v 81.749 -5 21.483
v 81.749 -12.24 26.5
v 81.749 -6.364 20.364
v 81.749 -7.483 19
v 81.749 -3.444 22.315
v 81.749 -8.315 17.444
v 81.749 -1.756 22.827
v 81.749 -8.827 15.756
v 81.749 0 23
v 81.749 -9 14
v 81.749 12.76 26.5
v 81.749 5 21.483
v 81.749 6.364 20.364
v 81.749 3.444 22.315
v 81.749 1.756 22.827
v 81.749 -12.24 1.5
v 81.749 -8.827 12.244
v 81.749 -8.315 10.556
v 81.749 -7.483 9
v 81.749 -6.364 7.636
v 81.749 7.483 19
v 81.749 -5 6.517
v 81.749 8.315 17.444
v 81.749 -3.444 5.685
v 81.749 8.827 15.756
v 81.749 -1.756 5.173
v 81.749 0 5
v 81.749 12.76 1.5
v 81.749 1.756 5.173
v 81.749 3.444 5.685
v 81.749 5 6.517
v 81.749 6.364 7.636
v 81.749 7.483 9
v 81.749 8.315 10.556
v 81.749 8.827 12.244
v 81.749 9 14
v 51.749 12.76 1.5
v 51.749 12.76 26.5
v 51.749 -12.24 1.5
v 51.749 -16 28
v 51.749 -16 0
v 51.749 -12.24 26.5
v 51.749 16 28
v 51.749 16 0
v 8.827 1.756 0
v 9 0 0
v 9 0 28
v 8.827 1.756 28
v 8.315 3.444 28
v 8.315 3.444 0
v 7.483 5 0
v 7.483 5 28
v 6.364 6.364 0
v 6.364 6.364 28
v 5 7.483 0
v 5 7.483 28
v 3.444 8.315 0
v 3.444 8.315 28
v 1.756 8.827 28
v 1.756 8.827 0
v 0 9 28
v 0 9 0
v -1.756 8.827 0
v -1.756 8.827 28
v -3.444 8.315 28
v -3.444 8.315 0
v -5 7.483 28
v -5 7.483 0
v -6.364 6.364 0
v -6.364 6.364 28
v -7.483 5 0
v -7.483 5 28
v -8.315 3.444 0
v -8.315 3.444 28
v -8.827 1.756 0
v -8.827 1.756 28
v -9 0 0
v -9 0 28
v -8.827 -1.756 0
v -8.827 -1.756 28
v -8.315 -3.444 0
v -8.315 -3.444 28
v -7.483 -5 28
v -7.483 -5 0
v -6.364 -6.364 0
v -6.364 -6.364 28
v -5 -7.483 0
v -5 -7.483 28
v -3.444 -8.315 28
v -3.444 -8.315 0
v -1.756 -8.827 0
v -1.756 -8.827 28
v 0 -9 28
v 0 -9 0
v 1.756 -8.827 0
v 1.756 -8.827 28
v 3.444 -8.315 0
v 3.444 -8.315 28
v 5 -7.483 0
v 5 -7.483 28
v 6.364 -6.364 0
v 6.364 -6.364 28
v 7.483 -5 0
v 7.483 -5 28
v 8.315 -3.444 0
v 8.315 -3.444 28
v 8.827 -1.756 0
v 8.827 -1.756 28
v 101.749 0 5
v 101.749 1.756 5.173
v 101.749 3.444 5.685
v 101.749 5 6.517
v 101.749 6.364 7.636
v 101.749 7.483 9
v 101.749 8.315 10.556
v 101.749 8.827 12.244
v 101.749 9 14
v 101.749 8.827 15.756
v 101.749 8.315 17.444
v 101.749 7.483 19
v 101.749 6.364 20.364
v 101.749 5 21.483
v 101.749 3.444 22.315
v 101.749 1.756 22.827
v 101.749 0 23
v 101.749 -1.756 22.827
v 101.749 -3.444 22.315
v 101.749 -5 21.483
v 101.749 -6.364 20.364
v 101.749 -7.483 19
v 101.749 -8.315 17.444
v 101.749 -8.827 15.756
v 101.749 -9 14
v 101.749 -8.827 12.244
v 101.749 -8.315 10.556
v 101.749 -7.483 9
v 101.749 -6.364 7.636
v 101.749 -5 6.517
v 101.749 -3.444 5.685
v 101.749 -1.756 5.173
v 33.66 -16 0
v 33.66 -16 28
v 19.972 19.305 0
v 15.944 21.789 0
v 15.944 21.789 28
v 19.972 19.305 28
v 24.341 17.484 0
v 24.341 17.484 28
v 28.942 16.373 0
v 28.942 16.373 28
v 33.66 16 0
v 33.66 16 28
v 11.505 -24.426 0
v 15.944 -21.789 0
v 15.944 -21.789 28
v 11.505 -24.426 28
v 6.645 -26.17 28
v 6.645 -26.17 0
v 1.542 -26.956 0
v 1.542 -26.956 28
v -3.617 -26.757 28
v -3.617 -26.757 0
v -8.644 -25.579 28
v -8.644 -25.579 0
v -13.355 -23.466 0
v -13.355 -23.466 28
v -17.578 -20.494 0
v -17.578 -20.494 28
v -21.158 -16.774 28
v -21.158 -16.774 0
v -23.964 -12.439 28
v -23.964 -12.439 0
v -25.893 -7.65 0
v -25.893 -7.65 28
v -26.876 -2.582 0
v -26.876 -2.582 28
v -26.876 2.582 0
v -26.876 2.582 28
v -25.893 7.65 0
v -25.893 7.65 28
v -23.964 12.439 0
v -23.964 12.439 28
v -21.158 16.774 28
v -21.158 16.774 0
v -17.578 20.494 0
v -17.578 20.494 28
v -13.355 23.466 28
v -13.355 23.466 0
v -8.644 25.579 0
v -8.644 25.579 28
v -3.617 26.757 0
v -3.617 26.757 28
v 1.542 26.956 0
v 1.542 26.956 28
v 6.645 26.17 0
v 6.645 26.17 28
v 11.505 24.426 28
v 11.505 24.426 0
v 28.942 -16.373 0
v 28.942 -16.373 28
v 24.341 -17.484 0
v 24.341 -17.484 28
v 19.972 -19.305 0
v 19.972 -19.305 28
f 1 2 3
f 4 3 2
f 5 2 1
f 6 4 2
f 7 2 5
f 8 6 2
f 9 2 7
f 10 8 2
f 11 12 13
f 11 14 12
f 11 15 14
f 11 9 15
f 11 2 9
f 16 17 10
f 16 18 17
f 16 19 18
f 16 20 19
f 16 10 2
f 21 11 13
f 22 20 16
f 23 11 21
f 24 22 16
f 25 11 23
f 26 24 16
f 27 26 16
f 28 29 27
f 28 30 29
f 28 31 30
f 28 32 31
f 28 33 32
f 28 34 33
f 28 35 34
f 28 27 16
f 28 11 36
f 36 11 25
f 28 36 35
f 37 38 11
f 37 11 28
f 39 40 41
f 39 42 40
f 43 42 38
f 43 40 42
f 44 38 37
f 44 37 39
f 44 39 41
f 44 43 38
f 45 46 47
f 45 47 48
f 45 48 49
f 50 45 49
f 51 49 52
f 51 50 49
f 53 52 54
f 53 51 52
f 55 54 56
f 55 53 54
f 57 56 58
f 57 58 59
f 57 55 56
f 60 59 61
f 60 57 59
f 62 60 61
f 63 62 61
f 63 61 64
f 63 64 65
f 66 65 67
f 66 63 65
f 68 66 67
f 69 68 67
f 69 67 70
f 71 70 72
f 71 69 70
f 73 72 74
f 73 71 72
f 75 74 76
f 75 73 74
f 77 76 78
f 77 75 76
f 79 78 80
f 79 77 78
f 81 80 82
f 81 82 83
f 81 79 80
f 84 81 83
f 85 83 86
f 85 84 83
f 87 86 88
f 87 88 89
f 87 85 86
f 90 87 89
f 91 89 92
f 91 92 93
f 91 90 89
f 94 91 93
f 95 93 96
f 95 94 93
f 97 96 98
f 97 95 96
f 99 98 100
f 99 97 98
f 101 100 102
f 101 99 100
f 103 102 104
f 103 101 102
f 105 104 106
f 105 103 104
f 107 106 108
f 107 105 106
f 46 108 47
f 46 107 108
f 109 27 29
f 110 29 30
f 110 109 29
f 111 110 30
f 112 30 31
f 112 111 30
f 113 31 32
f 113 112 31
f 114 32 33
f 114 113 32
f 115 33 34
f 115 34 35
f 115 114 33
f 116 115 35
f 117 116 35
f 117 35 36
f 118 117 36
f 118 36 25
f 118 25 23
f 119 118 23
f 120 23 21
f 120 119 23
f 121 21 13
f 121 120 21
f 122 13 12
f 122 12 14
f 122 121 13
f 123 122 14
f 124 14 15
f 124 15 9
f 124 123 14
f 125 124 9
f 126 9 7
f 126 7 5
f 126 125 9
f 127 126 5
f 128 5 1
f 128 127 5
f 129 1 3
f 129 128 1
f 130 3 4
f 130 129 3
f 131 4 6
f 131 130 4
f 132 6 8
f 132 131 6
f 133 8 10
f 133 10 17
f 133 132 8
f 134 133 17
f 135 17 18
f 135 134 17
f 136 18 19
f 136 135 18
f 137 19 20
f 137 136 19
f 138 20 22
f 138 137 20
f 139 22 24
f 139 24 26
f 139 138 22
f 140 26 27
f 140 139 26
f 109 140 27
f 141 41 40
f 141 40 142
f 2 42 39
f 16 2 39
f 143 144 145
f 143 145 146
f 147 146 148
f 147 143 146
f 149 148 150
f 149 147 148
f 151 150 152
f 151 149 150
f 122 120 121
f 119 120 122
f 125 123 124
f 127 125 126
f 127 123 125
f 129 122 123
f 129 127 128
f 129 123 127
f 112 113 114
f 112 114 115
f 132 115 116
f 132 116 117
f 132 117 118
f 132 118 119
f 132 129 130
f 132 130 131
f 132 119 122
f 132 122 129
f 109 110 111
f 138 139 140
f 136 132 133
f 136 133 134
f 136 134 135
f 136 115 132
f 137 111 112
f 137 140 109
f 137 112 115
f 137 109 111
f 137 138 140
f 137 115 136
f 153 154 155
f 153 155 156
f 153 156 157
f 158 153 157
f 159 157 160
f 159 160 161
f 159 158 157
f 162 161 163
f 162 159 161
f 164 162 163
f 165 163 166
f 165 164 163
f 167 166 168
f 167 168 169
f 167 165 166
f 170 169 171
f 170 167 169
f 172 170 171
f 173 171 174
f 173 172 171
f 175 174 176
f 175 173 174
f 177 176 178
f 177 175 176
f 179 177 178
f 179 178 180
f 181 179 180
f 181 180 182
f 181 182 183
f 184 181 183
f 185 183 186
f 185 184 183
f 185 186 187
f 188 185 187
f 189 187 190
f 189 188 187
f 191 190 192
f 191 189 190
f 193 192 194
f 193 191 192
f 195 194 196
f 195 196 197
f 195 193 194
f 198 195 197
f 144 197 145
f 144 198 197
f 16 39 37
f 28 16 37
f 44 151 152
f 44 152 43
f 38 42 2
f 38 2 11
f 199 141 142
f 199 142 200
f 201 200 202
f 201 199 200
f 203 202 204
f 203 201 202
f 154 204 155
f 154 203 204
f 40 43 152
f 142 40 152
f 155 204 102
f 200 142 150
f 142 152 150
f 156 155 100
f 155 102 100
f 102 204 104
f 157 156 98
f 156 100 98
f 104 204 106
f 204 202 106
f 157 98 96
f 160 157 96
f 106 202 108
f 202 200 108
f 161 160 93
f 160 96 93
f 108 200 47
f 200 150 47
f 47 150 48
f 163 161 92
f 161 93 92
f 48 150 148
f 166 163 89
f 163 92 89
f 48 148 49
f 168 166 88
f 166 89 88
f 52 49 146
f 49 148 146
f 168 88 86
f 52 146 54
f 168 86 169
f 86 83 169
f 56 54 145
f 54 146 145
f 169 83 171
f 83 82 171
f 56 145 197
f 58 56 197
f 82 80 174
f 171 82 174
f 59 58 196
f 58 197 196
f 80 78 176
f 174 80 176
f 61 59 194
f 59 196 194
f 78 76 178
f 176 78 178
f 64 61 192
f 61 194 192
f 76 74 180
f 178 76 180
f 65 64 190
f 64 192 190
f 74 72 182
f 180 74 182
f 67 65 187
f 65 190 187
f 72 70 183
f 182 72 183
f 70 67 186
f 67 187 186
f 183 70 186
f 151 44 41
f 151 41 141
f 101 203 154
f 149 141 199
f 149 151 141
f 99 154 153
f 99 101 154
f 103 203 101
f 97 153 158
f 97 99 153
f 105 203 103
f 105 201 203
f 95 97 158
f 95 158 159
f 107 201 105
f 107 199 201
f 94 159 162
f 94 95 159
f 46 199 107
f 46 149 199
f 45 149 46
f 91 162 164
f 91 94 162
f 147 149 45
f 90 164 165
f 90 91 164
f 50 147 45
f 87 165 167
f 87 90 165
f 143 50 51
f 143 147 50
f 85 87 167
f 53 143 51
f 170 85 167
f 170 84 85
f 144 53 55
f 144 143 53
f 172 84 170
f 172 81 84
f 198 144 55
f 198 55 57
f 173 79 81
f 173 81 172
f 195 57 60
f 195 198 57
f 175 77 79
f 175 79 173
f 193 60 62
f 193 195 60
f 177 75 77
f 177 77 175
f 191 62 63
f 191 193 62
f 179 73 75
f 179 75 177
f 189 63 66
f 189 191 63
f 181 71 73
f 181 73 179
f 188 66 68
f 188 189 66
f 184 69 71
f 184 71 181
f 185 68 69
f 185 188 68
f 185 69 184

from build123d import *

# Parameters (mm, degrees)
SKETCH5_R           = 9
BOSS_EXTRUDE7_DEPTH = 28
SKETCH6_OUTSIDE_W   = 58.478
SKETCH6_OUTSIDE_H   = 84.478
SKETCH6_OUTSIDE_R   = 9
CUT_EXTRUDE1_DEPTH  = 20
SKETCH7_OUTSIDE_W   = 58.478
SKETCH7_OUTSIDE_H   = 84.478
SKETCH7_OUTSIDE_W_2 = 25
SKETCH7_OUTSIDE_H_2 = 25
CUT_EXTRUDE3_DEPTH  = 30


with BuildPart() as part:
    # Sketch5 → Boss-Extrude7 (new body)
    with BuildSketch(Plane.XY):
        with BuildLine():
            Line((33.660065359, 16), (101.748563171, 16))
            Line((101.748563171, 16), (101.748563171, -16))
            Line((101.748563171, -16), (33.660065359, -16))
            ThreePointArc((33.660065359, -16), (24.341154196, -17.484076471), (15.944241486, -21.789473684))
            ThreePointArc((15.944241486, -21.789473684), (-27, 0), (15.944241486, 21.789473684))
            ThreePointArc((15.944241486, 21.789473684), (24.341154196, 17.484076471), (33.660065359, 16))
        make_face()
        Circle(SKETCH5_R, mode=Mode.SUBTRACT)
    extrude(amount=BOSS_EXTRUDE7_DEPTH)

    # Sketch6 outside → Cut-Extrude1 (cut)
    with BuildSketch(Plane(origin=(101.748563171, 0, 0), x_dir=(0, 0, -1), z_dir=(1, 0, 0))):
        with Locations((-14, 0)):
            Rectangle(SKETCH6_OUTSIDE_W, SKETCH6_OUTSIDE_H)
        with Locations((-14, 0)):
            Circle(SKETCH6_OUTSIDE_R, mode=Mode.SUBTRACT)
    extrude(amount=-CUT_EXTRUDE1_DEPTH, mode=Mode.SUBTRACT)

    # Sketch7 outside → Cut-Extrude3 (cut)
    with BuildSketch(Plane(origin=(81.748563171, 0, 0), x_dir=(0, 0, -1), z_dir=(1, 0, 0))):
        with Locations((-14, 0)):
            Rectangle(SKETCH7_OUTSIDE_W, SKETCH7_OUTSIDE_H)
        with Locations((-14, 0.259981409)):
            Rectangle(SKETCH7_OUTSIDE_W_2, SKETCH7_OUTSIDE_H_2, mode=Mode.SUBTRACT)
    extrude(amount=-CUT_EXTRUDE3_DEPTH, mode=Mode.SUBTRACT)


solid = part.part
